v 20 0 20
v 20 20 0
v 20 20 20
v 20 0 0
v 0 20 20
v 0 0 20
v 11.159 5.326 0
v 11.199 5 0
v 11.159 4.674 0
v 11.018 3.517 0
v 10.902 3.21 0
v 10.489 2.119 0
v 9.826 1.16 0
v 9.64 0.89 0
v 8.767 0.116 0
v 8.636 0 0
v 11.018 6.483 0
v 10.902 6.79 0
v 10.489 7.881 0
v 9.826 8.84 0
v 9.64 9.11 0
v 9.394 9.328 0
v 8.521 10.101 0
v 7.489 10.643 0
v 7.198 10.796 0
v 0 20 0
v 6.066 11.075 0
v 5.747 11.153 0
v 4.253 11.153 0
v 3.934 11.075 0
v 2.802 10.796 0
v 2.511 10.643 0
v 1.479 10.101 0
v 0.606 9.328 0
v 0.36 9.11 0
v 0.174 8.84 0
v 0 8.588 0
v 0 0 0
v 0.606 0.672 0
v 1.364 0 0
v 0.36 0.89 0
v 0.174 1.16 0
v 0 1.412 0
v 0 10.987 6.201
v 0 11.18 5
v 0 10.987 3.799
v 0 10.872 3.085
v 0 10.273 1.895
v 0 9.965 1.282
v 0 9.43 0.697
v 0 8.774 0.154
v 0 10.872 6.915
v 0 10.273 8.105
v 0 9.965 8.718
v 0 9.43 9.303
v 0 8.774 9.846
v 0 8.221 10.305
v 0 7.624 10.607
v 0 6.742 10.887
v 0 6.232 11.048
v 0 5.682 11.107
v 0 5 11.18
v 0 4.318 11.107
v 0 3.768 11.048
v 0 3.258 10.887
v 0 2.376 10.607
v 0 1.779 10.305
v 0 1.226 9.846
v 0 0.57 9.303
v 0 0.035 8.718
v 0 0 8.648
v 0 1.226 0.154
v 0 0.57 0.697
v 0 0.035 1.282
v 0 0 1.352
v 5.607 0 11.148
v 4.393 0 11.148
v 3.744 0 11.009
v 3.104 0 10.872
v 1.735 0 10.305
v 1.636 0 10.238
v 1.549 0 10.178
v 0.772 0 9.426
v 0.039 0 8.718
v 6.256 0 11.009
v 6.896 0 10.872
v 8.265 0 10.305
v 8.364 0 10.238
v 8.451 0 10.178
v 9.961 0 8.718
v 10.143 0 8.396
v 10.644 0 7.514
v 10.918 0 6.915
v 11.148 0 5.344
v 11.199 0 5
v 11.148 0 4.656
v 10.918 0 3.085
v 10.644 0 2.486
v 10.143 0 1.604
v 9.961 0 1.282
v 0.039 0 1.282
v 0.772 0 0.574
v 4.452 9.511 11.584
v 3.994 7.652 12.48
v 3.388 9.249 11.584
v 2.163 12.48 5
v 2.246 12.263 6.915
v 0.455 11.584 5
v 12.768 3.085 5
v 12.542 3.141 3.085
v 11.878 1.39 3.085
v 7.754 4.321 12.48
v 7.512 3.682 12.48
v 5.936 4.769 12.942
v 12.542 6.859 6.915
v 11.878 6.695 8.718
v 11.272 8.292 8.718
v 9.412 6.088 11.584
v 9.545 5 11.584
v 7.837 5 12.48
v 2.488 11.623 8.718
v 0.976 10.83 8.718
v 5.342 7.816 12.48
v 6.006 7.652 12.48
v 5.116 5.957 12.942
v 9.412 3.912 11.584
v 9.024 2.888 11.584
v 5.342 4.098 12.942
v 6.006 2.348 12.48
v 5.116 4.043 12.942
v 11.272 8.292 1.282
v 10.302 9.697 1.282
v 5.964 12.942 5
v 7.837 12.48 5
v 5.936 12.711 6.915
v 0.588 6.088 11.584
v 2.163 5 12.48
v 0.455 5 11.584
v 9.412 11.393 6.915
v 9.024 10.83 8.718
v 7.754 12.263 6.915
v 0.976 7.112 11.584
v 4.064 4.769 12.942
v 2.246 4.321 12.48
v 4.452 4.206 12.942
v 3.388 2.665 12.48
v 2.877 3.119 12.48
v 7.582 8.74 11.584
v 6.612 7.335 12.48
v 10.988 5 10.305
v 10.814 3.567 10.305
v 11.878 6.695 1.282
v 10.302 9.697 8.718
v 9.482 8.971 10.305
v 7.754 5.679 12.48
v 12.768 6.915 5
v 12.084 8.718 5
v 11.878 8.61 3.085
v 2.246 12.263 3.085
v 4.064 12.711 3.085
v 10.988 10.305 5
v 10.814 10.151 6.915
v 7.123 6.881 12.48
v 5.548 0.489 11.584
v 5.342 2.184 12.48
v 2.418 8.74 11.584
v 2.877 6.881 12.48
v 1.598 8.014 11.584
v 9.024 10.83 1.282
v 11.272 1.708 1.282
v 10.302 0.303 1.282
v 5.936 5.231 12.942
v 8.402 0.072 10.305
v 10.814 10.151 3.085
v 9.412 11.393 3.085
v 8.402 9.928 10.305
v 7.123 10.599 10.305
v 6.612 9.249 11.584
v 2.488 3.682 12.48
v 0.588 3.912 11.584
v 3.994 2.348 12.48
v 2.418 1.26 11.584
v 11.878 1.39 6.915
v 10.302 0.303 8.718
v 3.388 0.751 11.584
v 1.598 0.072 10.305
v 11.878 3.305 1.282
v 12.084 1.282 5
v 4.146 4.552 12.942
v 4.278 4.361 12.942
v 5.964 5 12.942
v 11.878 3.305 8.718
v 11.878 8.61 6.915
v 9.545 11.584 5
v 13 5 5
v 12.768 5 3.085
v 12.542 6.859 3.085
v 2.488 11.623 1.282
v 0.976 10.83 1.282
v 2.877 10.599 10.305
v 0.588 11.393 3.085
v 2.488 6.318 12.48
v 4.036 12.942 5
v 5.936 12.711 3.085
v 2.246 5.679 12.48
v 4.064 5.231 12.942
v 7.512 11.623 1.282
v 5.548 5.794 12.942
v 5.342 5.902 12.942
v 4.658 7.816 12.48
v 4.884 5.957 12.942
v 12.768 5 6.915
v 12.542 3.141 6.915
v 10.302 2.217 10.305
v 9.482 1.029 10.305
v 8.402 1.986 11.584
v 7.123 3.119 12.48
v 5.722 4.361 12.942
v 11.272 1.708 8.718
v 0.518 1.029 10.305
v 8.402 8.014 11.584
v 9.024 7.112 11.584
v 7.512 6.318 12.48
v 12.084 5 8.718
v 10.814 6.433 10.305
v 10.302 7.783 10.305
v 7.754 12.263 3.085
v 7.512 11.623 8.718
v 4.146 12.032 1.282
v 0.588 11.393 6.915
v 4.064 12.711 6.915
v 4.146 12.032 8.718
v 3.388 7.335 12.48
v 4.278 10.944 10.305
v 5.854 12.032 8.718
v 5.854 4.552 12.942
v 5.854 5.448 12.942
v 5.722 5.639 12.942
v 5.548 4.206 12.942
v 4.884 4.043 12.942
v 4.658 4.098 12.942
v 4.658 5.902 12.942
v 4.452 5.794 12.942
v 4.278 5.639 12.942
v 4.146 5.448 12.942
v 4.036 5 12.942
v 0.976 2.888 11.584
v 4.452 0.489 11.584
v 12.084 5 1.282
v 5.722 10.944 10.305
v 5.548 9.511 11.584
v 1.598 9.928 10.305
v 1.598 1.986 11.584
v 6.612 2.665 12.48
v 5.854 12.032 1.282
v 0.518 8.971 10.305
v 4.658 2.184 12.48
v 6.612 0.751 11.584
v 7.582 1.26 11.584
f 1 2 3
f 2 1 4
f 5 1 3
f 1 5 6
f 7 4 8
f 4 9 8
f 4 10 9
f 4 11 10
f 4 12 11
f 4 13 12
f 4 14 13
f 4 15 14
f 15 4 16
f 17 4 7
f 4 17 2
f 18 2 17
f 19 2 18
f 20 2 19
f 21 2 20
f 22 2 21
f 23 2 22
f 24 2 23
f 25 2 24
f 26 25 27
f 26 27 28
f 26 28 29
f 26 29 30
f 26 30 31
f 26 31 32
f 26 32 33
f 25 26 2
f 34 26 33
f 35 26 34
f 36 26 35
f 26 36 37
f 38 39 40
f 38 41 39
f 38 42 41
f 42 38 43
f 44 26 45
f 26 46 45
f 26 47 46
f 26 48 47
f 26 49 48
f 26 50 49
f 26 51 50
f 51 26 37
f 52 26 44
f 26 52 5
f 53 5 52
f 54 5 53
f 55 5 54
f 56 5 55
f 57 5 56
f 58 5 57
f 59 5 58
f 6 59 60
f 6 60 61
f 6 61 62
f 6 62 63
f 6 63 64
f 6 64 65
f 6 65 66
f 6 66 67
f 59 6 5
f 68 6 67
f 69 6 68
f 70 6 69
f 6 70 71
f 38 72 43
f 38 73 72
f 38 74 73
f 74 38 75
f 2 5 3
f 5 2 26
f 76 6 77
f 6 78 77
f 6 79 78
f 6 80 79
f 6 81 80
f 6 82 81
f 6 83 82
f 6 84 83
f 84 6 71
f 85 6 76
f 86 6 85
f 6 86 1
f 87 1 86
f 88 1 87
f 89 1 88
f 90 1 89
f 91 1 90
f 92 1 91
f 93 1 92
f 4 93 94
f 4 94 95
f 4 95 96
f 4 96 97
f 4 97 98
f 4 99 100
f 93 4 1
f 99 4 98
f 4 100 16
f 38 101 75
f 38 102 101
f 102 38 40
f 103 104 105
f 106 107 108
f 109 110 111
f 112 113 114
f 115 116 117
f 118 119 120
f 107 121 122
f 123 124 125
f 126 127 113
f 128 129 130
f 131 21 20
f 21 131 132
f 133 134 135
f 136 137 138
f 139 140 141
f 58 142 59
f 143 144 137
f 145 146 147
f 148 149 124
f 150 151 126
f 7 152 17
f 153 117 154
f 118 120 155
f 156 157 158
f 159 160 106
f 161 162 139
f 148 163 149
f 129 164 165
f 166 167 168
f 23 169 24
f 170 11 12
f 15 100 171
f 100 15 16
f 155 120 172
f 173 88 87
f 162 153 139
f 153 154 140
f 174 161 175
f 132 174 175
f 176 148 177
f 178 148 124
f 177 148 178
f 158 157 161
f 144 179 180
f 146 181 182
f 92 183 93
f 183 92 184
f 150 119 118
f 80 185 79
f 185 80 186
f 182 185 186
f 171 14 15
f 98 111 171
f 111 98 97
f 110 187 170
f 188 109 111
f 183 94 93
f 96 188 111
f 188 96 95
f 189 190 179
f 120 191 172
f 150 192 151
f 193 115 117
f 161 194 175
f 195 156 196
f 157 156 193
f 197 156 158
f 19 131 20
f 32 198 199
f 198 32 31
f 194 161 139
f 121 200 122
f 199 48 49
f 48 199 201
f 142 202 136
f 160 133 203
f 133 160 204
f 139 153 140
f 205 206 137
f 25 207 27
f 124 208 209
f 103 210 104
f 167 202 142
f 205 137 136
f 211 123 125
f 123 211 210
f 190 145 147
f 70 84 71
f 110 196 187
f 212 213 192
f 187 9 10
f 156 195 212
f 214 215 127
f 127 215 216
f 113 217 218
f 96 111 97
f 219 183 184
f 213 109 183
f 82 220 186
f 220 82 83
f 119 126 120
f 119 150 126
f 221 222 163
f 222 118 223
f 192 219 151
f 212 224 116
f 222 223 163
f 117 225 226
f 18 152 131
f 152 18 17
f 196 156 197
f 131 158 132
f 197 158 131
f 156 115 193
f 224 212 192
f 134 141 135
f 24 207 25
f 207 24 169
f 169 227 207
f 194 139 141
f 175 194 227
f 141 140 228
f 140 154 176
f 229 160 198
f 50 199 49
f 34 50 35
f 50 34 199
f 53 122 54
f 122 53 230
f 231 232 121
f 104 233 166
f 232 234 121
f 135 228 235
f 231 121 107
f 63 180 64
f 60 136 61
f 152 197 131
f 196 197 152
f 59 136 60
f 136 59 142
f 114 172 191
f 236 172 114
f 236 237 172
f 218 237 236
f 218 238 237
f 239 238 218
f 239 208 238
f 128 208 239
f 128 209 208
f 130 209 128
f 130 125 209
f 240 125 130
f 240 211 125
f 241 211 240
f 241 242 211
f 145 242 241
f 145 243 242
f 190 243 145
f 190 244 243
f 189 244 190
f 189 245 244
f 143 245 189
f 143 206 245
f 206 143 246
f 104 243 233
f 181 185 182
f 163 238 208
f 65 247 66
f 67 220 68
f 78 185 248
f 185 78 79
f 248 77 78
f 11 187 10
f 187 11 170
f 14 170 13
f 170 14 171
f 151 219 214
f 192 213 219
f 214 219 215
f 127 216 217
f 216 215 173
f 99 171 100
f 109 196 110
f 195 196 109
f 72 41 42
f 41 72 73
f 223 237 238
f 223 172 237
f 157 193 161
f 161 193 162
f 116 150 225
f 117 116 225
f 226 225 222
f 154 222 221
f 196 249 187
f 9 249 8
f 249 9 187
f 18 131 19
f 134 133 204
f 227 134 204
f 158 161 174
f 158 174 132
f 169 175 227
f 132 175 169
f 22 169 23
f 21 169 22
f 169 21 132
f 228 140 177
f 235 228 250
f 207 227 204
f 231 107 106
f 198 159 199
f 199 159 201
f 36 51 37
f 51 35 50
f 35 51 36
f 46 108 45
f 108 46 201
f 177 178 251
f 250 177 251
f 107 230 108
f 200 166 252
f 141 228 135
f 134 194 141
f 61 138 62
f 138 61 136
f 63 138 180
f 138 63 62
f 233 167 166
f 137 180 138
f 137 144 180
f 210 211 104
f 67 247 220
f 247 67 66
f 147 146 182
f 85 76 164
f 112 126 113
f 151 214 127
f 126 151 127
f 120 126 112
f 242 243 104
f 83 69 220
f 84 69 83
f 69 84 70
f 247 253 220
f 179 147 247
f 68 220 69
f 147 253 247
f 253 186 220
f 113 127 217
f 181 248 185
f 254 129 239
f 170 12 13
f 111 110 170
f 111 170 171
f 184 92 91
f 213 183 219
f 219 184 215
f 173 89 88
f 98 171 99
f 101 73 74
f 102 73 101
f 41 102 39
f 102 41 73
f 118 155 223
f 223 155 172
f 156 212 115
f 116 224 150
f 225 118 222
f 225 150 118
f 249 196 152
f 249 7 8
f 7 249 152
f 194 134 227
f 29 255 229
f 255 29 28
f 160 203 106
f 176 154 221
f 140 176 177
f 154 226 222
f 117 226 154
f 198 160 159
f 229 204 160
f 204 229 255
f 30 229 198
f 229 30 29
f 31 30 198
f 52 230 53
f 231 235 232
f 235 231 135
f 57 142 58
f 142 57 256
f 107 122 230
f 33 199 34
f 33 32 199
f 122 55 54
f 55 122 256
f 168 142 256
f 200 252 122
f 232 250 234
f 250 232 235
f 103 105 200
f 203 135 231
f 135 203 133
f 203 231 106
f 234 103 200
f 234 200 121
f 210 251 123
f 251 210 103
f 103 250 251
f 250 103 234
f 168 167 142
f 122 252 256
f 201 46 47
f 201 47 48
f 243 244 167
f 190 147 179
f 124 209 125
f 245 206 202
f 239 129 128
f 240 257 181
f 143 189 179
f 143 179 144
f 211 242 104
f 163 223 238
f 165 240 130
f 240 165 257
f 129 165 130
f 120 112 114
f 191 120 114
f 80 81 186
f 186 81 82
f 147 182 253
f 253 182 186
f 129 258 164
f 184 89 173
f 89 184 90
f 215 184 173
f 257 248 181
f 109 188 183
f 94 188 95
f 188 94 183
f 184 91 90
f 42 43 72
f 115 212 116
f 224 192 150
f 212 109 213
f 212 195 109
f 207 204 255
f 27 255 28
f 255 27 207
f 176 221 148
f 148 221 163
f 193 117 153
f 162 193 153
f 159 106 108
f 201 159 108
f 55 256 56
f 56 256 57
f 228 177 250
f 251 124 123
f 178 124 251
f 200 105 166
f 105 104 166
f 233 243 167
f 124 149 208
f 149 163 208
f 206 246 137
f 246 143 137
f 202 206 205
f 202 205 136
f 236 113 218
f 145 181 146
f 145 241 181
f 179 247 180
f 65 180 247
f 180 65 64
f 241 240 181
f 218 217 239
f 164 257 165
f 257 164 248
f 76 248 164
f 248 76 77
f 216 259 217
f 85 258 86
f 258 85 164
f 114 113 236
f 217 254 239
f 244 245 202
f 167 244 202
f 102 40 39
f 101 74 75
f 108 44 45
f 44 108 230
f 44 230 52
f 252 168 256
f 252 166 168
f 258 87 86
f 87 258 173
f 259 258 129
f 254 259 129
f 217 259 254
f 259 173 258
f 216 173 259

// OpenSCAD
difference() {
    cube(20);
    translate([5, 5, 5]) {
        sphere(8);
        }
}
